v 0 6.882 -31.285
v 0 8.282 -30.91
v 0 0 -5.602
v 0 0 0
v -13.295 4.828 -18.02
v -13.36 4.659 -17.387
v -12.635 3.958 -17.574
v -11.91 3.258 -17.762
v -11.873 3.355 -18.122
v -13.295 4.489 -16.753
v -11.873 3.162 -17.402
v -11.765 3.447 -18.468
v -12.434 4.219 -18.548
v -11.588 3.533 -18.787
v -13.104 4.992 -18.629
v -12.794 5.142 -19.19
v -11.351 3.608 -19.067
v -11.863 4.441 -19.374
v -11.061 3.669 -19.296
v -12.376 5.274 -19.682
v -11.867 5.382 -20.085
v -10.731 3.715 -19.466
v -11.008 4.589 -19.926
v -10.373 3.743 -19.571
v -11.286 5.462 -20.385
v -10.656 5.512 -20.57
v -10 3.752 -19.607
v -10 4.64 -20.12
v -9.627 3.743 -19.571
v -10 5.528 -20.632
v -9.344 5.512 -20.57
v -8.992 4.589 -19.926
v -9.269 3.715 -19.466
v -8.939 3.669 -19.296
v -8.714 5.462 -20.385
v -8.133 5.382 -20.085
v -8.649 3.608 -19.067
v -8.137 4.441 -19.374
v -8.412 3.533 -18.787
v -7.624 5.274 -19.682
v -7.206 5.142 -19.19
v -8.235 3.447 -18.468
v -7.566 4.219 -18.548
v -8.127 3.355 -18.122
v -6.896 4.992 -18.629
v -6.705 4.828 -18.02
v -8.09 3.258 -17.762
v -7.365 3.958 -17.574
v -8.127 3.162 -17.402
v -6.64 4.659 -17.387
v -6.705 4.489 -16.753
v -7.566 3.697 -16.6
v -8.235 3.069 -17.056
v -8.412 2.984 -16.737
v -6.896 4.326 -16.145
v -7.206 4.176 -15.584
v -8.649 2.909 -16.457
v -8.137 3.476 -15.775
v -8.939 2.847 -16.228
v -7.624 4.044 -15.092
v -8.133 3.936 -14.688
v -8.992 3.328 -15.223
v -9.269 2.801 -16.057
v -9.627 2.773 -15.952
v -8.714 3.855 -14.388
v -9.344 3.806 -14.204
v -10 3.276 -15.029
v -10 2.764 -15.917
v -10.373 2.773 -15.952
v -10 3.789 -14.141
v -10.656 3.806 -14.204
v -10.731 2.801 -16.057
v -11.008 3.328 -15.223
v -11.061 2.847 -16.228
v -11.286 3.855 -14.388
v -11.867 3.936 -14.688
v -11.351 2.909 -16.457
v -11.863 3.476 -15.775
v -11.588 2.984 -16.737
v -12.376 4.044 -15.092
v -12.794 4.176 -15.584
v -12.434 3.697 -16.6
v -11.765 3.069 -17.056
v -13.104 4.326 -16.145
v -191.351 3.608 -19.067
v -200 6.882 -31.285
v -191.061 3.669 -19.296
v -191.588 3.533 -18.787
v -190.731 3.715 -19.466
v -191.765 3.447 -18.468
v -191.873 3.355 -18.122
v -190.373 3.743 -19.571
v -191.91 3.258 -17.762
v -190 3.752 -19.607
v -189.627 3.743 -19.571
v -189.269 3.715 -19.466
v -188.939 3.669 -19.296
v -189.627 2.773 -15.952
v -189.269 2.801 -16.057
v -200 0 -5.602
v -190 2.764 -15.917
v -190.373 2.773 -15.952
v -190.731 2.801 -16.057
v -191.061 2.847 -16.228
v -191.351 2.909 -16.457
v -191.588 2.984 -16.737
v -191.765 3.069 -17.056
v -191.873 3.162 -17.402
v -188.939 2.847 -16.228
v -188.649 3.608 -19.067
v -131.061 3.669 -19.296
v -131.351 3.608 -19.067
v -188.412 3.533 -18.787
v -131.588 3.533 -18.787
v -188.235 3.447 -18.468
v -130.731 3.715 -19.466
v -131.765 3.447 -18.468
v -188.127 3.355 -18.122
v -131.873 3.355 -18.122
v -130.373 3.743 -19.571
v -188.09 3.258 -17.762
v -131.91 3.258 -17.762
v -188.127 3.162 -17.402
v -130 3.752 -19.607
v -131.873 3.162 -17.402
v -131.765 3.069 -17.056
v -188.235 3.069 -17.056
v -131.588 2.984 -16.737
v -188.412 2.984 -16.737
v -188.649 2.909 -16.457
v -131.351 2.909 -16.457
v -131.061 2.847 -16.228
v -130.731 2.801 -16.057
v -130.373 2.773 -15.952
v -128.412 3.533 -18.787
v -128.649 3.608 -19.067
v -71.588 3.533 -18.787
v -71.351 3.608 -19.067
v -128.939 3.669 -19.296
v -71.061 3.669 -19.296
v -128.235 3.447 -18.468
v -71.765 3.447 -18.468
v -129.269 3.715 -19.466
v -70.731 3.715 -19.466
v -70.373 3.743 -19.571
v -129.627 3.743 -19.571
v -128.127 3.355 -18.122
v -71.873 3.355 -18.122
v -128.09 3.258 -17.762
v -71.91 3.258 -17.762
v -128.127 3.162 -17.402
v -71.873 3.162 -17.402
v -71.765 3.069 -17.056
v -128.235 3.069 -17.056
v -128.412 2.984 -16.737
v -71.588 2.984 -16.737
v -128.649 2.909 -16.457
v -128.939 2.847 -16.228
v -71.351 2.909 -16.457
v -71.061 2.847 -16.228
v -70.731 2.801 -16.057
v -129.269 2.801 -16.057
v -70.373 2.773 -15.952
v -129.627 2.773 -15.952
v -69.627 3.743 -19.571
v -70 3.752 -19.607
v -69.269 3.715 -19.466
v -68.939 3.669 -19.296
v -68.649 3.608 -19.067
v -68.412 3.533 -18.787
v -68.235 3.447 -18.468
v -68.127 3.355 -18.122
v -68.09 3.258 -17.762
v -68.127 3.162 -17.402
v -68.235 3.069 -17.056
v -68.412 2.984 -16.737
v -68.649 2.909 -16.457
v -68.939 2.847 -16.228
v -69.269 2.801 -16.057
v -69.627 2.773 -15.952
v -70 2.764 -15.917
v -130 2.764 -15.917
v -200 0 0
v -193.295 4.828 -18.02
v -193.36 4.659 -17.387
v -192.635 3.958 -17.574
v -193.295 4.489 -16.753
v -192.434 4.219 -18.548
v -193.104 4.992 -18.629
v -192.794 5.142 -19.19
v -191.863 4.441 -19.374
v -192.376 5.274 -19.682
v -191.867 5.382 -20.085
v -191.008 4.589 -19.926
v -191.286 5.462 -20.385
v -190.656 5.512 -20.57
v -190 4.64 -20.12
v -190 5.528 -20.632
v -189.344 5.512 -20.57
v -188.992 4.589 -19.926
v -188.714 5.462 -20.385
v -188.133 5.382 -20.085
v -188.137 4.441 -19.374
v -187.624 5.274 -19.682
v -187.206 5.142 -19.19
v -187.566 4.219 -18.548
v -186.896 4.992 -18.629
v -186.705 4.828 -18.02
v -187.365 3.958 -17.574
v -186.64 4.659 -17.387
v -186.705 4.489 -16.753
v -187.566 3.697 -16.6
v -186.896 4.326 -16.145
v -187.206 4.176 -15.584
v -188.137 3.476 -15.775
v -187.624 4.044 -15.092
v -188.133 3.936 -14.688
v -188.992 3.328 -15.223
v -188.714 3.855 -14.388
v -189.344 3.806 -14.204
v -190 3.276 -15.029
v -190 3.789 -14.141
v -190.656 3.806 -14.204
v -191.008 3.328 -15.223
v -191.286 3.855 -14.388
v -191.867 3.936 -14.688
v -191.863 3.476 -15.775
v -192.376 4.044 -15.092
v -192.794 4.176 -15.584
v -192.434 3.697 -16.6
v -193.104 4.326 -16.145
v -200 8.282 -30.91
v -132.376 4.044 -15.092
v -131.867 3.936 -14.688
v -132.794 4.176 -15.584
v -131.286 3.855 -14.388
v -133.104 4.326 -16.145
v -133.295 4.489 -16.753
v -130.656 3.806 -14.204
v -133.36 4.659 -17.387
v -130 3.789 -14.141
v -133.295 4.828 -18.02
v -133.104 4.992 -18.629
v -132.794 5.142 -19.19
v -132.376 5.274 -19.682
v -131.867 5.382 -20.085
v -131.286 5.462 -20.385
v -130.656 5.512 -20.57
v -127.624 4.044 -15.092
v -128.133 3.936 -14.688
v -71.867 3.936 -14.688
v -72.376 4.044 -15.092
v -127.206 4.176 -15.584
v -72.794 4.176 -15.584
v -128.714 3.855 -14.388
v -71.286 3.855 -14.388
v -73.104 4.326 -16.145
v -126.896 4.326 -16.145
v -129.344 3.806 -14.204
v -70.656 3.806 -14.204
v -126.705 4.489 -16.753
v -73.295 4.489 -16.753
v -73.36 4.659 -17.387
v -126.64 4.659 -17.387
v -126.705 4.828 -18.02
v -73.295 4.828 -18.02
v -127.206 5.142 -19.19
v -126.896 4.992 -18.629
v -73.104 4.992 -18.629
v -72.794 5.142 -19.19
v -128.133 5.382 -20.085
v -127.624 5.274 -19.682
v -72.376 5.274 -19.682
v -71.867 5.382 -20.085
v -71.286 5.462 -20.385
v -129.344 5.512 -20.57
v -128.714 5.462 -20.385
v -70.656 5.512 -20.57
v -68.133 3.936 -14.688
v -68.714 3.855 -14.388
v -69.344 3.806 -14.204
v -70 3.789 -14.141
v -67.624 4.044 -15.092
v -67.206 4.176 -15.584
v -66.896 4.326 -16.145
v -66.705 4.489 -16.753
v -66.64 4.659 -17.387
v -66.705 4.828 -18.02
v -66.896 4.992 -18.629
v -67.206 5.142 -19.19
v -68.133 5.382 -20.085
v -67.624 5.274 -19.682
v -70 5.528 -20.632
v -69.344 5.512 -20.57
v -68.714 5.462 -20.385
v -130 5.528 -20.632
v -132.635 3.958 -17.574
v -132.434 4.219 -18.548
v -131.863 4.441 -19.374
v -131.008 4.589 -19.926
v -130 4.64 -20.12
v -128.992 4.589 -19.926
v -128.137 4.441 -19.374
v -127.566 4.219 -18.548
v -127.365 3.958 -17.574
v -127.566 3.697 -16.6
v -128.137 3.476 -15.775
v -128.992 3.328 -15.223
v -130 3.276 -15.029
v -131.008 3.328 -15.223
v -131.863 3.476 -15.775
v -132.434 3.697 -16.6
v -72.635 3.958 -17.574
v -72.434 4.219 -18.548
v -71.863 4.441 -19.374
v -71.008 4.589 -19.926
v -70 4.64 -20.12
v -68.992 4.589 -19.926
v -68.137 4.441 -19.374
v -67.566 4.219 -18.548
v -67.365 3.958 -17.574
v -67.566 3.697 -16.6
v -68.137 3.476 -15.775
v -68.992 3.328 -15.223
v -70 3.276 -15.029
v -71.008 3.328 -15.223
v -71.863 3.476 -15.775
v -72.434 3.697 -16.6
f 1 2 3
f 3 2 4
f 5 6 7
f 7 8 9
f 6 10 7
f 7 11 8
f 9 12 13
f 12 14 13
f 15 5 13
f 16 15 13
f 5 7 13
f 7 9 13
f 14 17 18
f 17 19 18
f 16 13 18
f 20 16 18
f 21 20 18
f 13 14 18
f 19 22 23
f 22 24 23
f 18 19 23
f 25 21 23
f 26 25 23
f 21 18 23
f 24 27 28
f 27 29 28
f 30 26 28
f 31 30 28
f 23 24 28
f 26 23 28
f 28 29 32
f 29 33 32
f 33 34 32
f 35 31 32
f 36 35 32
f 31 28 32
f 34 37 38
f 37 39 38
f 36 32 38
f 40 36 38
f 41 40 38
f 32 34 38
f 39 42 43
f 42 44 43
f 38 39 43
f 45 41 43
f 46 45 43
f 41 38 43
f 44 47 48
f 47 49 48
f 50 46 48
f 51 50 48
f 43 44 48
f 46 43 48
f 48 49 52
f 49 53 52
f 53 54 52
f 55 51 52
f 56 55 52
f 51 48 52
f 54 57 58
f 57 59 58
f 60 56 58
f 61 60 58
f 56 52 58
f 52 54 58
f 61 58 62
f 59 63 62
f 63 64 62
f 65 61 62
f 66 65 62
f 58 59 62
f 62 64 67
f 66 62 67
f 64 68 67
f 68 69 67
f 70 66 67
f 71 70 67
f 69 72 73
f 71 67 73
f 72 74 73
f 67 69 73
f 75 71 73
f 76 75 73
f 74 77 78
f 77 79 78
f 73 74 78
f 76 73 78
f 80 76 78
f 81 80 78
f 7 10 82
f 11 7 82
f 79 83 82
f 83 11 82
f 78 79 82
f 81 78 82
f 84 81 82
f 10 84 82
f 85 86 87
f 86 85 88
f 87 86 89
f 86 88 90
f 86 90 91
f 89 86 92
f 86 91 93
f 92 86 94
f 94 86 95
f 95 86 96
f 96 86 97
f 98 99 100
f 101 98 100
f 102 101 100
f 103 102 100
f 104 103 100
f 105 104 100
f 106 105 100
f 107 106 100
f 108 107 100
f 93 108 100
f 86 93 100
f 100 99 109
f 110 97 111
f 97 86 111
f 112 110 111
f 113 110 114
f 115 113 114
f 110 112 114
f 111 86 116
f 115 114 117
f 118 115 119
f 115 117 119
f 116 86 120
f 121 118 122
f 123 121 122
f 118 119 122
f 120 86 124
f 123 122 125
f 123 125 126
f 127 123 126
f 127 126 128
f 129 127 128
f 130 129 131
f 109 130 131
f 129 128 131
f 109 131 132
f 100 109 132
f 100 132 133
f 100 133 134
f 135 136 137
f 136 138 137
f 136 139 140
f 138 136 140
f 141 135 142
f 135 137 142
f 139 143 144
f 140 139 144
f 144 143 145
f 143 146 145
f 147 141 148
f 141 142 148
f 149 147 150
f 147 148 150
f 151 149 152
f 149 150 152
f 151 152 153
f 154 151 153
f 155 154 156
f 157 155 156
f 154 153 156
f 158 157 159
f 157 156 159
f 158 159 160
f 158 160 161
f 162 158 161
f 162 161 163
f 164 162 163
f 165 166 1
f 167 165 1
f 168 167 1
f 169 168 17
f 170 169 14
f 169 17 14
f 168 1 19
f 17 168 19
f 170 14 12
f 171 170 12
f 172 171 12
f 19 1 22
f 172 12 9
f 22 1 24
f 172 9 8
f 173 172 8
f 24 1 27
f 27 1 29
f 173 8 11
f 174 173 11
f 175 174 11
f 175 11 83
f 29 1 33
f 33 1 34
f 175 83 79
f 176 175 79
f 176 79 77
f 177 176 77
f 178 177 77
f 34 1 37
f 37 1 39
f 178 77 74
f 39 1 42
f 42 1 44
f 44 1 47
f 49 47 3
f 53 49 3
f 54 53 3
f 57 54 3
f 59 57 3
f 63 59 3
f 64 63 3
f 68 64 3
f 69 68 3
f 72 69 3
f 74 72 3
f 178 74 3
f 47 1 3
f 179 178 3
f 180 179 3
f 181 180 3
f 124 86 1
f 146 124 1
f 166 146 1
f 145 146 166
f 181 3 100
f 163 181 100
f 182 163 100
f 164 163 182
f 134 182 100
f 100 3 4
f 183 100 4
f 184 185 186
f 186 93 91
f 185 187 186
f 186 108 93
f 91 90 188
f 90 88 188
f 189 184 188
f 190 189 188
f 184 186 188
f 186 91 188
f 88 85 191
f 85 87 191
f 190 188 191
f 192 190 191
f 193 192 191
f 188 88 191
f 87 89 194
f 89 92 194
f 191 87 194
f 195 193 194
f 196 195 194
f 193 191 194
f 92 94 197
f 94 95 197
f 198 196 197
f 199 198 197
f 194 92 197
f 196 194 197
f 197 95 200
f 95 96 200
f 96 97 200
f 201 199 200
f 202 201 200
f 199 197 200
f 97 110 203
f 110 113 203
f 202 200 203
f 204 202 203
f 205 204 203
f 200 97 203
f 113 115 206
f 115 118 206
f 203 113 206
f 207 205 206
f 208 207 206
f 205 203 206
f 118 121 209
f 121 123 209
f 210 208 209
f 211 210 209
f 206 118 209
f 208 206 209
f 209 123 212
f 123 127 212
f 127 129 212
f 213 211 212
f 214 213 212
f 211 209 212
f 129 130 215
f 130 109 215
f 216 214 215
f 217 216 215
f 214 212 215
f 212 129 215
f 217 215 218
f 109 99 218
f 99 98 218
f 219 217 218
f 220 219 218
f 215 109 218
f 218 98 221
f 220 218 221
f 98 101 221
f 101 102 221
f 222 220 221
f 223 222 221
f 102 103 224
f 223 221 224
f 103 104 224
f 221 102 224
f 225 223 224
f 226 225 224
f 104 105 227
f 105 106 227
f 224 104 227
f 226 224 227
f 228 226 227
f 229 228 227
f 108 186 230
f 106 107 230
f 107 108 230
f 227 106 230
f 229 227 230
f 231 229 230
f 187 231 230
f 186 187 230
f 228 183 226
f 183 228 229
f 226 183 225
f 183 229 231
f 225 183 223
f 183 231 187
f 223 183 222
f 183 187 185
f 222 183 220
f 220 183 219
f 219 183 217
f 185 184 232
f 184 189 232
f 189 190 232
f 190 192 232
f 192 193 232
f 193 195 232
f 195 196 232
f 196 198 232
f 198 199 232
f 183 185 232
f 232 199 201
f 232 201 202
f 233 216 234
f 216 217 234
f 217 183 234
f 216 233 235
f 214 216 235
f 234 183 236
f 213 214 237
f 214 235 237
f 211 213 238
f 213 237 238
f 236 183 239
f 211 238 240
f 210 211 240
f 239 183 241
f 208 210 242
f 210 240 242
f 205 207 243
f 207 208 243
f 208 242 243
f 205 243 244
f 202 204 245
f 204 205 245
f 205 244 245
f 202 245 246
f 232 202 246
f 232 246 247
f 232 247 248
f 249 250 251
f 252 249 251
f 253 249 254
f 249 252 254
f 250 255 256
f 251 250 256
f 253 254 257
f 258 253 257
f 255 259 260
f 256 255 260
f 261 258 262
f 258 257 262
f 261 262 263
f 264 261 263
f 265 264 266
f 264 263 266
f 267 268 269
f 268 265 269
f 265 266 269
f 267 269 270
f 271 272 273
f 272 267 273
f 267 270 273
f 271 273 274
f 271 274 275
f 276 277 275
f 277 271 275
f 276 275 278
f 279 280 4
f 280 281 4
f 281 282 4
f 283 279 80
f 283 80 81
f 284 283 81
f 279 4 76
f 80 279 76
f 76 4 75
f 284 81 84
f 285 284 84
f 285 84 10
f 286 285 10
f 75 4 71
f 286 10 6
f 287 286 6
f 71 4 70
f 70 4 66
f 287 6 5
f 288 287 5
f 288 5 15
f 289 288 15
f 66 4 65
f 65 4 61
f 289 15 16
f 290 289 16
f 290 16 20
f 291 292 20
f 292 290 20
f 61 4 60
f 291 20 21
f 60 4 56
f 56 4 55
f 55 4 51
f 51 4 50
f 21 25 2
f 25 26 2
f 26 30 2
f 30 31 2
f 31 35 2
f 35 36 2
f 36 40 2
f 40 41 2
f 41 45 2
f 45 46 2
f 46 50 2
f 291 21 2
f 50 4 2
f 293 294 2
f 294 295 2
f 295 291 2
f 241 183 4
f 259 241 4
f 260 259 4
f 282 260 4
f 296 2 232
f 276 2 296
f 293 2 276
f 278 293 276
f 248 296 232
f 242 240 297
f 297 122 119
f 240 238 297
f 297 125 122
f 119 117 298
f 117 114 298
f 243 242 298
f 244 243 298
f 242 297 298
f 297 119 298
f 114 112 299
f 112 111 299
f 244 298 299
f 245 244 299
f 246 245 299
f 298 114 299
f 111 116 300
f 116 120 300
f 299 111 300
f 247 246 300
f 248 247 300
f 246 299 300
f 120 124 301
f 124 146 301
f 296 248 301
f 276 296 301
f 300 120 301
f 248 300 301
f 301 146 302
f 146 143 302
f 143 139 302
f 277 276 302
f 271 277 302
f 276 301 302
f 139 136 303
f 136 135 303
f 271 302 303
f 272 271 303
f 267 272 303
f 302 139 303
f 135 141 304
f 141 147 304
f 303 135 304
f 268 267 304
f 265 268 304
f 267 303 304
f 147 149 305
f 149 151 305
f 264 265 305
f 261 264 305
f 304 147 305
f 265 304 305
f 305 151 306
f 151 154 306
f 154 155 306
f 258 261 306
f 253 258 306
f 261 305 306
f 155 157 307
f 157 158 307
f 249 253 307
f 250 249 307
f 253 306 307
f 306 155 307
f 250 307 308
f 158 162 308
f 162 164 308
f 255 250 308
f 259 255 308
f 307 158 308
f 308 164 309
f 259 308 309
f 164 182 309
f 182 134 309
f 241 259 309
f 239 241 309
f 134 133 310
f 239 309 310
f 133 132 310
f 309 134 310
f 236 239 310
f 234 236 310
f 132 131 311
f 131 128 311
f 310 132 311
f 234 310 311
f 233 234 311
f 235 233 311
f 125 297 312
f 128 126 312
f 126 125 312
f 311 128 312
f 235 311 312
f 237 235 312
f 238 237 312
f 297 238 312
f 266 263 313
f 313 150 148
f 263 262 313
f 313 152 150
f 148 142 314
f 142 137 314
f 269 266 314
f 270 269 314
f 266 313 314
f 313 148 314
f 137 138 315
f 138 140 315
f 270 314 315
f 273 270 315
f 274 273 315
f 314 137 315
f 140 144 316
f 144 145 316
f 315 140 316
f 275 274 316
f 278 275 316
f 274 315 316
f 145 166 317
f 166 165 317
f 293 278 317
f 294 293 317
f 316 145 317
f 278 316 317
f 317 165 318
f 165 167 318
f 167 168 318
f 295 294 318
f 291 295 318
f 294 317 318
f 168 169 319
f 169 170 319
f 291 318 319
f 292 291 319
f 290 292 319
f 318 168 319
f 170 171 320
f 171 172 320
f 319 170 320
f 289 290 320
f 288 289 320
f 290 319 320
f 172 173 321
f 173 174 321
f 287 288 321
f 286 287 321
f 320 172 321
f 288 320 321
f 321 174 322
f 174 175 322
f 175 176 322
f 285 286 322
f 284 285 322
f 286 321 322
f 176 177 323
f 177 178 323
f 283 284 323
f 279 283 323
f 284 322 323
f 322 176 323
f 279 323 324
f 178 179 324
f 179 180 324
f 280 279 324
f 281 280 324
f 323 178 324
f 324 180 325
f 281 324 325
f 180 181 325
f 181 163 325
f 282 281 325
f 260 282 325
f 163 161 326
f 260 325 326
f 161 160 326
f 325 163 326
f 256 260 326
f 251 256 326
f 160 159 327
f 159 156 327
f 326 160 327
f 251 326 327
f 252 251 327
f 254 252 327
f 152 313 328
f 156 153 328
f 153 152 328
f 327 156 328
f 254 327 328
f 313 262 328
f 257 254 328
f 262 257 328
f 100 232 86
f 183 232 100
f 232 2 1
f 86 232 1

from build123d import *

# Parameters (mm, degrees)
SALIENTE_EXTRUIR1_DEPTH                              = 200
REFRENTADO_PARA_TORNILLO_TAP_N_CON_CABEZ_D           = 3.4
REFRENTADO_PARA_TORNILLO_TAP_N_CON_CABEZ_CSINK_D     = 6.72
REFRENTADO_PARA_TORNILLO_TAP_N_CON_CABEZ_CSINK_ANGLE = 90


with BuildPart() as part:
    # Croquis1 → Saliente-Extruir1 (new body)
    with BuildSketch(Plane(origin=(0, 0, 0), x_dir=(0, 0, -1), z_dir=(1, 0, 0))):
        Polygon((0, 0), (30.909626441, 8.282209443), (31.284914057, 6.881616995), (5.602369792, 0), align=None)
    extrude(amount=-SALIENTE_EXTRUIR1_DEPTH)

    # Refrentado para tornillo tapón con cabeza plana de clavija de M31 (through all)
    with Locations(Plane(origin=(0, 0, 0), x_dir=(1, 0, 0), z_dir=(0, 0.9659258262890681, 0.2588190451025215))):
        with Locations((-190, 18), (-130, 18), (-70, 18), (-10, 18)):
            CounterSinkHole(REFRENTADO_PARA_TORNILLO_TAP_N_CON_CABEZ_D / 2, REFRENTADO_PARA_TORNILLO_TAP_N_CON_CABEZ_CSINK_D / 2, counter_sink_angle=REFRENTADO_PARA_TORNILLO_TAP_N_CON_CABEZ_CSINK_ANGLE)


solid = part.part
